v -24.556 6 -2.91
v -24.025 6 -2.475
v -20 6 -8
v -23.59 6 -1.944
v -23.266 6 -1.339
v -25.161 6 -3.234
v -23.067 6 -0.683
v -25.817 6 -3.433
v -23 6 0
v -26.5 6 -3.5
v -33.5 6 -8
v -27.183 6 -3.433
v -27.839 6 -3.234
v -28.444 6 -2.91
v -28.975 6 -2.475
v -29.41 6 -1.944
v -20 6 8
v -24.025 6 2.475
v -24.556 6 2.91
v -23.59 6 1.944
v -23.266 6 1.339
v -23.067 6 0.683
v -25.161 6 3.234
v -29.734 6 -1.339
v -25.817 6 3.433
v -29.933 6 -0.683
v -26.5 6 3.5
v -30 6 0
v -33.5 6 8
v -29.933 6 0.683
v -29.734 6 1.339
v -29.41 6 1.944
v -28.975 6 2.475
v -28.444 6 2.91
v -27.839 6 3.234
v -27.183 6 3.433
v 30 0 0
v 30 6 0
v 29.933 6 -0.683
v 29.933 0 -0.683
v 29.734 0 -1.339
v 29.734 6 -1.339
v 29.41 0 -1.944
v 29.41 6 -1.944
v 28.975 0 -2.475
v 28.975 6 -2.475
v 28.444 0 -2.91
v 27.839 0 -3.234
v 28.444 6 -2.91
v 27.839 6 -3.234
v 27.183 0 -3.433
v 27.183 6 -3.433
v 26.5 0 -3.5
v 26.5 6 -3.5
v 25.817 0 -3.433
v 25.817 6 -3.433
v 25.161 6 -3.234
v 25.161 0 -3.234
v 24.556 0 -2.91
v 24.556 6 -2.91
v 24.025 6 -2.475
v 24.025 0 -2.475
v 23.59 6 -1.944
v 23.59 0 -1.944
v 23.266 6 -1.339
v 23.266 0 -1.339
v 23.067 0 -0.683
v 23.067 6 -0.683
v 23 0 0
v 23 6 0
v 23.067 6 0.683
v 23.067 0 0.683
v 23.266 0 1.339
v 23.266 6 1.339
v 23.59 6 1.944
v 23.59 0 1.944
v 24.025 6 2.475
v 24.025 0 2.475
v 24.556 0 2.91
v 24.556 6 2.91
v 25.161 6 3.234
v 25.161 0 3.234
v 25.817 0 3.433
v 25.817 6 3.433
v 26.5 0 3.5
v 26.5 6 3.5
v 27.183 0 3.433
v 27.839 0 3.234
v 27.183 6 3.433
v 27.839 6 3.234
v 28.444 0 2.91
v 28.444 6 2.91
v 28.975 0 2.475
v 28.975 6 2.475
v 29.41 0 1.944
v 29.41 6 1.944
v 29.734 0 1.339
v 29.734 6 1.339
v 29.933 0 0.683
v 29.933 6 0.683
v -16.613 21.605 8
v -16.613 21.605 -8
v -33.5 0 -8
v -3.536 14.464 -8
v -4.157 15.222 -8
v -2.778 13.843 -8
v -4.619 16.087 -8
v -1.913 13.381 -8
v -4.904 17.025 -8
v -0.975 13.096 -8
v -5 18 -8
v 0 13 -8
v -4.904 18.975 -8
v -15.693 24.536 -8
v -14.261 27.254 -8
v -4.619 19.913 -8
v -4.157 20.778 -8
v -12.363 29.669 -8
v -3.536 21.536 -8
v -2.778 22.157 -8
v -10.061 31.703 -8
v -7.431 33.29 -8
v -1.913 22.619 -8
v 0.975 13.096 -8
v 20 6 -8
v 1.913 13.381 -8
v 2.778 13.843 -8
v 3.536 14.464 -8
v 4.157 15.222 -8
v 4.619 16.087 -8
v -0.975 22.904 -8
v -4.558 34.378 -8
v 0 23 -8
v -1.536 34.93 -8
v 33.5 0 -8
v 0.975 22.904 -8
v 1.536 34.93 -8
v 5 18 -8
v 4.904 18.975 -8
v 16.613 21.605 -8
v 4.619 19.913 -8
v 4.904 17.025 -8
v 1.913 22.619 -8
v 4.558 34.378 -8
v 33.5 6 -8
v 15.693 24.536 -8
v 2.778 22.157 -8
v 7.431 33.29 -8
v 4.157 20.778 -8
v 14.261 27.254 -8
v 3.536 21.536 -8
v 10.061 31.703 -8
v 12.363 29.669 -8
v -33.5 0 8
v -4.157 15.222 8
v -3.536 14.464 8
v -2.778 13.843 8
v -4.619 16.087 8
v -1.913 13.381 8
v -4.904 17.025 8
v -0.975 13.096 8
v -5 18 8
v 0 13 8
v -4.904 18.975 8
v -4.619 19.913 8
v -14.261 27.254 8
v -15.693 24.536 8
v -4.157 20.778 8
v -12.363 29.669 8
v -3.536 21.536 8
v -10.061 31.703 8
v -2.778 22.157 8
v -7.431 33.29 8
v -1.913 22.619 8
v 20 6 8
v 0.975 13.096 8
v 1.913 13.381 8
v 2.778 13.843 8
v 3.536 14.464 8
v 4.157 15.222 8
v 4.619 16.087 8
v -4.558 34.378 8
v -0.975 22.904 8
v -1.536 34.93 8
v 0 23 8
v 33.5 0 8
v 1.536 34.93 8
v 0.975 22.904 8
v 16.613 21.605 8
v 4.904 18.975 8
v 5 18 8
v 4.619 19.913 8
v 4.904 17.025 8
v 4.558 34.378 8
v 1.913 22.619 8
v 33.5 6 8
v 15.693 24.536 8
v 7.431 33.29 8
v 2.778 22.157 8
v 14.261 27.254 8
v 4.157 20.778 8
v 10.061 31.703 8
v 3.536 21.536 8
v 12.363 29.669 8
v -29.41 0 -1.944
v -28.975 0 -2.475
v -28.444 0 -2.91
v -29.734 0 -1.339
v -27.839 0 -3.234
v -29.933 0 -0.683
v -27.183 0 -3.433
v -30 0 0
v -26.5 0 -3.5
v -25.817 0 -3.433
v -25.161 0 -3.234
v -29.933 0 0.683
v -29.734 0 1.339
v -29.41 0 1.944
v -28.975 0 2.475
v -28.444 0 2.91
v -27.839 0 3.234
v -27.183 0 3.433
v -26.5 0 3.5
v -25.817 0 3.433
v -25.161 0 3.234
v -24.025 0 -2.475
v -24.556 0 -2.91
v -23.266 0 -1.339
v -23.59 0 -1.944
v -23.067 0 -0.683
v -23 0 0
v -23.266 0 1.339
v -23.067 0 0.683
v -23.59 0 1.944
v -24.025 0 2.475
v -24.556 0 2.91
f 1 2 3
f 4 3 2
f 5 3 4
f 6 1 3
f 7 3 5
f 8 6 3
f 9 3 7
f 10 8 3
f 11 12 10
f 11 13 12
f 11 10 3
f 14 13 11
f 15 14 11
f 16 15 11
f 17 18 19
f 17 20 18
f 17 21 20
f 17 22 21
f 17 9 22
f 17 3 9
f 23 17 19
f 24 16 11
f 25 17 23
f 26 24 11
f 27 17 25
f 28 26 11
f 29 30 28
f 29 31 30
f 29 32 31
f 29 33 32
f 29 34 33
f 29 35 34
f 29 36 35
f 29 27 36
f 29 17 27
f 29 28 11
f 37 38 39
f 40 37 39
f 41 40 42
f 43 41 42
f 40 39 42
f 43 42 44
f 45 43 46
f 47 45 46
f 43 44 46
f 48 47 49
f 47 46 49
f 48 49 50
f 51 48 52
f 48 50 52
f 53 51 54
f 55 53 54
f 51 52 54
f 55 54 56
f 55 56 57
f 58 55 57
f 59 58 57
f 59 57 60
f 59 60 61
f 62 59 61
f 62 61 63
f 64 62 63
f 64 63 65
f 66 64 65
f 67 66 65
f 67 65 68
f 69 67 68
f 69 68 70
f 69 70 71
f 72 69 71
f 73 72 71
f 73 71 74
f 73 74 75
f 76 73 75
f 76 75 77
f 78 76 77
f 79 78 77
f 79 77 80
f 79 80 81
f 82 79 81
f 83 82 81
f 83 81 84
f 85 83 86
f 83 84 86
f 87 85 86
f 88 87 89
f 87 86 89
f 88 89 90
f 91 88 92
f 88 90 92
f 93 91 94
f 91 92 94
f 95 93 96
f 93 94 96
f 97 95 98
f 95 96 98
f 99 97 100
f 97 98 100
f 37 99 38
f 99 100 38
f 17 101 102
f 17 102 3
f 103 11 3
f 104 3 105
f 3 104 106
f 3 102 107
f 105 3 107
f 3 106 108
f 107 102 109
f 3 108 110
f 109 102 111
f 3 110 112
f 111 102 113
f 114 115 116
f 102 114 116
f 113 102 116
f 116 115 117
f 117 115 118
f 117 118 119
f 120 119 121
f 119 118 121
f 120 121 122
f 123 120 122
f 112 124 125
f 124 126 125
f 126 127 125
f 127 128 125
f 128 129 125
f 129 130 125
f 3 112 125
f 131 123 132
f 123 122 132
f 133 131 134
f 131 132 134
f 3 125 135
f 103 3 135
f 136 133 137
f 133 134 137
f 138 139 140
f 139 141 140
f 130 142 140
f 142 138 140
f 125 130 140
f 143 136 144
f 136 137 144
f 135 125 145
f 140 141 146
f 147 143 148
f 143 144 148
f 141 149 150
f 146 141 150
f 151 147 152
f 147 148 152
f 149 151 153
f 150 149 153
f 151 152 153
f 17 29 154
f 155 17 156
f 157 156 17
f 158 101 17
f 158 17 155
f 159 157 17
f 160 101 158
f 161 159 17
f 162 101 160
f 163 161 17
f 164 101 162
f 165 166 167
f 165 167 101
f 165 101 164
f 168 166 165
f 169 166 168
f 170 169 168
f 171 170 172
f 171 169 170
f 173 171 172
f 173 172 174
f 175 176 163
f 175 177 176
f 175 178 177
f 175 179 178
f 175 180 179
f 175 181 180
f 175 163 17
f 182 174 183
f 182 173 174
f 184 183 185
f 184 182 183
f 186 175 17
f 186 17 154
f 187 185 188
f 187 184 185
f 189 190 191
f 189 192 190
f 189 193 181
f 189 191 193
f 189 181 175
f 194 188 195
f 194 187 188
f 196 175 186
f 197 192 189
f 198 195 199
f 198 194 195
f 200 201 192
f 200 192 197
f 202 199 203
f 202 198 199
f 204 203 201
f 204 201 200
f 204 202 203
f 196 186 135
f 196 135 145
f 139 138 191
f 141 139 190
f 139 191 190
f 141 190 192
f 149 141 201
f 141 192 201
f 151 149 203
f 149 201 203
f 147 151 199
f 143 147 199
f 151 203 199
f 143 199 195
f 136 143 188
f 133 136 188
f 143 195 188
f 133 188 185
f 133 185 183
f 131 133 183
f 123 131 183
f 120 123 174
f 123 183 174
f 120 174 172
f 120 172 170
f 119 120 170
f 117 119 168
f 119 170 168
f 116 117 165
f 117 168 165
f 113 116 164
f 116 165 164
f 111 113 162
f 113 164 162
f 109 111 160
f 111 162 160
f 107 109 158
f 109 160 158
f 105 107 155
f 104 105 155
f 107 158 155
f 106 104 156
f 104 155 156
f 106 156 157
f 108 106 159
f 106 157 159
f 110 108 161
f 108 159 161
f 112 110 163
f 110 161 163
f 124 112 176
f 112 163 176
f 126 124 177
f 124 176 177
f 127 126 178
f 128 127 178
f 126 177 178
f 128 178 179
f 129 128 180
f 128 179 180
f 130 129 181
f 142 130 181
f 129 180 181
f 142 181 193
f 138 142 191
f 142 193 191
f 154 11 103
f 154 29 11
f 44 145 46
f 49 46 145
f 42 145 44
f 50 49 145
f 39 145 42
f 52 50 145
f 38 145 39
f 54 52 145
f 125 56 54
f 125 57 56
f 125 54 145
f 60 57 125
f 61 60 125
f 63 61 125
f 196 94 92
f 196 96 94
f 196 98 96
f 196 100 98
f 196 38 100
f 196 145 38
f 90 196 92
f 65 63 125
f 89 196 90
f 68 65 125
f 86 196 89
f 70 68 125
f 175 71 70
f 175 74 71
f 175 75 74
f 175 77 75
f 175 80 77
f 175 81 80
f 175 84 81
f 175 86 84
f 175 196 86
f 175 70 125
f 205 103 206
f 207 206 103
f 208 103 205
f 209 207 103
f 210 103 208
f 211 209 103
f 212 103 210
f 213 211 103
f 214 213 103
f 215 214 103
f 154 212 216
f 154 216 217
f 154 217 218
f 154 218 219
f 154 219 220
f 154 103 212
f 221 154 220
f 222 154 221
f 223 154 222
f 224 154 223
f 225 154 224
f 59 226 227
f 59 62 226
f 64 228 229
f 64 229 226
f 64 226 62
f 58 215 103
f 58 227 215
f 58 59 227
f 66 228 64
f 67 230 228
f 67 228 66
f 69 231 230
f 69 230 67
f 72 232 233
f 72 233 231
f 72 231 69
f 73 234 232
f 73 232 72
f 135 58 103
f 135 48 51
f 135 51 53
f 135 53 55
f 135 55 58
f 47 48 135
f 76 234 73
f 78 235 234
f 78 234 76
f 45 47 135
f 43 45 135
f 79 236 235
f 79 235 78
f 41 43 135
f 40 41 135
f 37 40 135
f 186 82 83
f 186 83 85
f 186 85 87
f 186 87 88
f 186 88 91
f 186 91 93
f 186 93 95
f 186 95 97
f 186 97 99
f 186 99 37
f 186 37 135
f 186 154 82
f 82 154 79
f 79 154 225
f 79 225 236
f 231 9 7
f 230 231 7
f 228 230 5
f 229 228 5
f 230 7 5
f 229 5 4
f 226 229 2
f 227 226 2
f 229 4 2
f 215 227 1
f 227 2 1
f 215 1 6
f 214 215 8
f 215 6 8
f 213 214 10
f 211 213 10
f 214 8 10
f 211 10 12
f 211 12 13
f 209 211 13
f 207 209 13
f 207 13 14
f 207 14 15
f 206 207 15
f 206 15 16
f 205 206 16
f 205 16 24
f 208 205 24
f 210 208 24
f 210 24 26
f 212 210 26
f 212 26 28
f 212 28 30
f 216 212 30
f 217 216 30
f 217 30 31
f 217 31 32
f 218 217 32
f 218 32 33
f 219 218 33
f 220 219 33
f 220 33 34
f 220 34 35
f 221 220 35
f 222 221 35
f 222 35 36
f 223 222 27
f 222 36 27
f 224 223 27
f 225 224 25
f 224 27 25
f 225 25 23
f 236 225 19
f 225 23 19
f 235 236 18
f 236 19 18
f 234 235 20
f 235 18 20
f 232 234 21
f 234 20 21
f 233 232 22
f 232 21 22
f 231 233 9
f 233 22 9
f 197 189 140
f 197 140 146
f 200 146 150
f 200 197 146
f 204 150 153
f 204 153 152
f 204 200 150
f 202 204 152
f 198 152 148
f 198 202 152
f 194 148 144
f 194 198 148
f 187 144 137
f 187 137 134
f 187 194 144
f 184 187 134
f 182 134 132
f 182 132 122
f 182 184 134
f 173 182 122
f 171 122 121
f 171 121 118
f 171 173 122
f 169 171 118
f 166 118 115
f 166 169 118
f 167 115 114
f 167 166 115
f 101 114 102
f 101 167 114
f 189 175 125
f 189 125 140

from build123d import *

# Parameters (mm, degrees)
EXTRUDE_1_DEPTH     = 8
SKETCH_2_R          = 3.5
CUT_EXTRUDE_1_DEPTH = 16
SKETCH_3_R          = 5
CUT_EXTRUDE_2_DEPTH = 16


with BuildPart() as part:
    # 草图1 → 凸台-拉伸1 (new body, symmetric)
    with BuildSketch(Plane.XY):
        with BuildLine():
            Line((-33.5, 0), (33.5, 0))
            Line((33.5, 0), (33.5, 6))
            Line((33.5, 6), (20, 6))
            Line((20, 6), (16.613269784, 21.605449639))
            ThreePointArc((16.613269784, 21.605449639), (0, 35), (-16.613269784, 21.605449639))
            Line((-16.613269784, 21.605449639), (-20, 6))
            Line((-20, 6), (-33.5, 6))
            Line((-33.5, 6), (-33.5, 0))
        make_face()
    extrude(amount=EXTRUDE_1_DEPTH, both=True)

    # 草图2 → 切除-拉伸1 (cut)
    with BuildSketch(Plane(origin=(0, 6, 0), x_dir=(1, 0, 0), z_dir=(0, 1, 0))):
        with Locations((-26.5, 0)):
            Circle(SKETCH_2_R)
        with Locations((26.5, 0)):
            Circle(SKETCH_2_R)
    extrude(amount=-CUT_EXTRUDE_1_DEPTH, mode=Mode.SUBTRACT)

    # 草图3 → 切除-拉伸2 (cut)
    with BuildSketch(Plane.XY.offset(8)):
        with Locations((0, 18)):
            Circle(SKETCH_3_R)
    extrude(amount=-CUT_EXTRUDE_2_DEPTH, mode=Mode.SUBTRACT)


solid = part.part
